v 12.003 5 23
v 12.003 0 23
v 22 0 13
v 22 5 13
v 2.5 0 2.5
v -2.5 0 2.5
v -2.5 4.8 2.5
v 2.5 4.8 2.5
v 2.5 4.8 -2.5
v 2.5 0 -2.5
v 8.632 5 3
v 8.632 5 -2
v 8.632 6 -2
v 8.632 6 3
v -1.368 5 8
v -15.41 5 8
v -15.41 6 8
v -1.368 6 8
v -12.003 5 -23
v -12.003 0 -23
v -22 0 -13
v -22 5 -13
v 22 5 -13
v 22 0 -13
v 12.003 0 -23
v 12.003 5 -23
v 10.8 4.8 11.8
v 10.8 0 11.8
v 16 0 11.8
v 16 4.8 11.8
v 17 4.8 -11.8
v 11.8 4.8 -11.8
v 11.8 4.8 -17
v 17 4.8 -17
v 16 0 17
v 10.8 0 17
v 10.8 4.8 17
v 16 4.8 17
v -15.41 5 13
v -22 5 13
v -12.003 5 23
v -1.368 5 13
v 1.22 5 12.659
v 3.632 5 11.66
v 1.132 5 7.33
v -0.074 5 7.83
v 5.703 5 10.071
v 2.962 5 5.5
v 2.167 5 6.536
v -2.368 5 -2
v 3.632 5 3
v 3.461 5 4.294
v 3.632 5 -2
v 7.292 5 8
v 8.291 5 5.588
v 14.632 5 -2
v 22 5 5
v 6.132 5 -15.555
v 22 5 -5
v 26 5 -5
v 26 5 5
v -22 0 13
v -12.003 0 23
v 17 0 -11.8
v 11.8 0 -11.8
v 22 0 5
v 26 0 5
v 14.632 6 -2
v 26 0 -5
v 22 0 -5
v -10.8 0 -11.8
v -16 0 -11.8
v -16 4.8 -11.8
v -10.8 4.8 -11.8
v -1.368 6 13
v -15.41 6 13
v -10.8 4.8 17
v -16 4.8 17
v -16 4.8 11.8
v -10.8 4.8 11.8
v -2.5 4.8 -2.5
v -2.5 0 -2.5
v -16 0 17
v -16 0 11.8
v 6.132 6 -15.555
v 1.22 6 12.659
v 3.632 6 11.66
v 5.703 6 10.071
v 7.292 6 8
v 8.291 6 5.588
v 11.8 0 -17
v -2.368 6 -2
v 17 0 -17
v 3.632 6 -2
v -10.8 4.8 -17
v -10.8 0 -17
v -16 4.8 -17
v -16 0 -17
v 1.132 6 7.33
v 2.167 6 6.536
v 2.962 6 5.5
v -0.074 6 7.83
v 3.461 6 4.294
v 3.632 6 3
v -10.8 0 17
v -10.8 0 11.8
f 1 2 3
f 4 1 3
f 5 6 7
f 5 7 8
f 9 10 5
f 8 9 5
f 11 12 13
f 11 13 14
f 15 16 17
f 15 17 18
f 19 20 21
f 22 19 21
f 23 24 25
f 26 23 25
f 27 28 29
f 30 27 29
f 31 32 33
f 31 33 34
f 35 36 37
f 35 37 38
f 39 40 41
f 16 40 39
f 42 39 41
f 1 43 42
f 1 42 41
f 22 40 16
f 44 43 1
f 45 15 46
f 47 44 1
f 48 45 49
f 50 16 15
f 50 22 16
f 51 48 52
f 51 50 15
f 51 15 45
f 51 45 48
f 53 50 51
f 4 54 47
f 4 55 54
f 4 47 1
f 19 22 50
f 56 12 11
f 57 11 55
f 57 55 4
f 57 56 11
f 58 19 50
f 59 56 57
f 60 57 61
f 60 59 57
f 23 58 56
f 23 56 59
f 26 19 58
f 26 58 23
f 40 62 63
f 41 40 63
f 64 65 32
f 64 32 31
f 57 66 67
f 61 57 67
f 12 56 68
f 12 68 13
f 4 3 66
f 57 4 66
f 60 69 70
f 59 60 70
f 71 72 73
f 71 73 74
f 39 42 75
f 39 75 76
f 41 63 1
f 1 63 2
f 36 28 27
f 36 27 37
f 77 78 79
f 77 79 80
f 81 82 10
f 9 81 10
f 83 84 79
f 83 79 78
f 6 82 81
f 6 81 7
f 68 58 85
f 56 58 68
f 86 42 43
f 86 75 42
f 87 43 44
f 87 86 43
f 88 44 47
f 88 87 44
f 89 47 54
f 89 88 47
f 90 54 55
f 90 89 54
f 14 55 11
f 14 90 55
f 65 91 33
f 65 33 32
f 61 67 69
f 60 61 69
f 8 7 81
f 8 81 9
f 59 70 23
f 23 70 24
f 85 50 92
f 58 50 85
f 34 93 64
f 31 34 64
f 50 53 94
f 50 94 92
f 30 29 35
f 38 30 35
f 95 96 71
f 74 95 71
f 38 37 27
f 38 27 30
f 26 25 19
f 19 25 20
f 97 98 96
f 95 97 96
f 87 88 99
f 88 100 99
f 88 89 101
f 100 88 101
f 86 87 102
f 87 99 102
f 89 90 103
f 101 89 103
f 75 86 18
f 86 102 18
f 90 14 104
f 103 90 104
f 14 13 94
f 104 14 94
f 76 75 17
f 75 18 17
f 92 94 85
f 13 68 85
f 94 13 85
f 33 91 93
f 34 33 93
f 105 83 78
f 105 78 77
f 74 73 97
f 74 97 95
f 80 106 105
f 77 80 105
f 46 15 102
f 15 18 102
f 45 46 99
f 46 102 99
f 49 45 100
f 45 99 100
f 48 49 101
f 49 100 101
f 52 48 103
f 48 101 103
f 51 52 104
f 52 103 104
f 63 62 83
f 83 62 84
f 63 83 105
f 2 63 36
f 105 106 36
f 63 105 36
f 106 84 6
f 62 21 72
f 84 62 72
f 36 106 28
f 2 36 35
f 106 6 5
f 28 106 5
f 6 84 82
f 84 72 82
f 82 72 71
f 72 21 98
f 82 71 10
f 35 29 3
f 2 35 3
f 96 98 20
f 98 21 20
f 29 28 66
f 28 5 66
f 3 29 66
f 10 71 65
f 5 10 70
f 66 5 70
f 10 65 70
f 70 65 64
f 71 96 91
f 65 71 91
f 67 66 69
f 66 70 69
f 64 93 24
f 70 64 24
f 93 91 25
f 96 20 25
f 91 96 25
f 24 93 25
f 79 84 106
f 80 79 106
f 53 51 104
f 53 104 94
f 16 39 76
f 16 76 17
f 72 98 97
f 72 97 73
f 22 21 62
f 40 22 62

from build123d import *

# Parameters (mm, degrees)
BOSS_EXTRU_1_DEPTH      = 5
BOSS_EXTRU_2_DEPTH      = 1
ESQUISSE3_W             = 5.2
ESQUISSE3_H             = 5.2
ESQUISSE3_W_2           = 5
ESQUISSE3_H_2           = 5
ENL_V_MAT_EXTRU_1_DEPTH = 4.8
CONG_1_R                = 10
CONG_2_R                = 5


with BuildPart() as part:
    # Esquisse1 → Boss.-Extru.1 (new body)
    with BuildSketch(Plane(origin=(0, 0, 0), x_dir=(1, 0, 0), z_dir=(0, 1, 0))):
        Polygon((22, 13), (12.003020456, 23), (-12.003020456, 23), (-22, 13), (-22, -13), (-12.003020456, -23), (12.003020456, -23), (22, -13), (22, -5), (26, -5), (26, 5), (22, 5), align=None)
    extrude(amount=BOSS_EXTRU_1_DEPTH)

    # Esquisse2 → Boss.-Extru.2 (add)
    with BuildSketch(Plane(origin=(0, 5, 0), x_dir=(1, 0, 0), z_dir=(0, 1, 0))):
        Polygon((-15.409608561, -8), (3.631850655, -8), (3.631850655, 2), (-2.368149345, 2), (6.131850655, 15.555441712), (14.631850655, 2), (8.631850655, 2), (8.631850655, -13), (-15.409608561, -13), align=None)
    extrude(amount=BOSS_EXTRU_2_DEPTH)

    # Esquisse3 → Enlèv. mat.-Extru.1 (cut)
    with BuildSketch(Plane.XZ):
        with Locations((-13.4, 14.4)):
            Rectangle(ESQUISSE3_W, ESQUISSE3_H)
        with Locations((-13.4, -14.4)):
            Rectangle(ESQUISSE3_W, ESQUISSE3_H)
        with Locations((14.4, -14.4)):
            Rectangle(ESQUISSE3_W, ESQUISSE3_H)
        with Locations((13.4, 14.4)):
            Rectangle(ESQUISSE3_W, ESQUISSE3_H)
        Rectangle(ESQUISSE3_W_2, ESQUISSE3_H_2)
    extrude(amount=-ENL_V_MAT_EXTRU_1_DEPTH, mode=Mode.SUBTRACT)

    # Congé1
    cong_1_edges = [part.edges().sort_by_distance(p)[0] for p in [
        (8.631850655, 5.5, 13),
    ]]
    fillet(cong_1_edges, radius=CONG_1_R)

    # Congé2
    cong_2_edges = [part.edges().sort_by_distance(p)[0] for p in [
        (3.631850655, 5.5, 8),
    ]]
    fillet(cong_2_edges, radius=CONG_2_R)


solid = part.part
